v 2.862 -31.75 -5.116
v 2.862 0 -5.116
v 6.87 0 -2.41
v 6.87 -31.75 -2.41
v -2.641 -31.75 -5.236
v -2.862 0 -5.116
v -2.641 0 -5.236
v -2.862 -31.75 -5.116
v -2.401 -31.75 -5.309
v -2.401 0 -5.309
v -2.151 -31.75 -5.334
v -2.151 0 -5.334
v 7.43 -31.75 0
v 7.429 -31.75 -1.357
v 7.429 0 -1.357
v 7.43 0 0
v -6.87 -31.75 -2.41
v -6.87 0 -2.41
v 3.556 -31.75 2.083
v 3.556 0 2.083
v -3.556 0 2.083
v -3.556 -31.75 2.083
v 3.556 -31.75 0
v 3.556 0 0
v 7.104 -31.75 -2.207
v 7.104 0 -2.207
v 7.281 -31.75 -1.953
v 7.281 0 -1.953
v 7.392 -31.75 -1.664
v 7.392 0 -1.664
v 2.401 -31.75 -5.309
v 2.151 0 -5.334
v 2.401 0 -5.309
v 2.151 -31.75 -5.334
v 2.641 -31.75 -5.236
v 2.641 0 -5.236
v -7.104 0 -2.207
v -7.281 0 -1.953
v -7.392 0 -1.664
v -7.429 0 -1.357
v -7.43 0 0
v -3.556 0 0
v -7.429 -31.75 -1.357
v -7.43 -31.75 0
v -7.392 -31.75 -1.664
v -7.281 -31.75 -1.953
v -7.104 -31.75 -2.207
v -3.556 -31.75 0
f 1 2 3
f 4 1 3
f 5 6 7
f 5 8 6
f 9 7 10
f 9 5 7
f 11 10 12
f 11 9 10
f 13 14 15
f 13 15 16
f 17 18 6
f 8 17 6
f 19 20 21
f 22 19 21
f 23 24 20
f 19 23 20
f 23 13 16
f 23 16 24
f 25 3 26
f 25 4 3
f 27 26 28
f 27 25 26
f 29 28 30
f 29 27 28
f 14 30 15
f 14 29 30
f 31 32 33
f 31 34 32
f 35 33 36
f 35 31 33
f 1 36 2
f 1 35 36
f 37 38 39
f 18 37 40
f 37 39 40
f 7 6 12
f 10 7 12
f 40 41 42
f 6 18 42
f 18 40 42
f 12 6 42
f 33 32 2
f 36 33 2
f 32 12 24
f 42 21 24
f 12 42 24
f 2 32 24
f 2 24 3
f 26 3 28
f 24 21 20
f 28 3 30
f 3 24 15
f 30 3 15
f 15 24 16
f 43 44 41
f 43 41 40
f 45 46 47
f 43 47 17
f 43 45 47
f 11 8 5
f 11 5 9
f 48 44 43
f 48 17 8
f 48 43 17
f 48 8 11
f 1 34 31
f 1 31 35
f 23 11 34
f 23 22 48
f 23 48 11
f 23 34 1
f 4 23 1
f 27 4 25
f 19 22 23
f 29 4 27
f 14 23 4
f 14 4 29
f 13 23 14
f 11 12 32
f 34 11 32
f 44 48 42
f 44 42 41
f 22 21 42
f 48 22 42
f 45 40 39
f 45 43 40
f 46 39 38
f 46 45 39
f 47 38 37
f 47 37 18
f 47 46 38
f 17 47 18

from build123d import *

# Parameters (mm, degrees)
F1_DEPTH = 31.75
F3_R     = 1.27


# Not quite as in the source:
# - a feature names something its author has since deleted; it is built from what else it names


with BuildPart() as f1:
    # F0 (on Front) → F1 (new body)
    with BuildSketch(Plane.XZ):
        Polygon((3.556, 2.0828), (-3.556, 2.0828), (-3.556, 0), (-7.4295, 0), (-7.4295, -2.032), (-2.54, -5.334), (2.54, -5.334), (7.4295, -2.032), (7.4295, 0), (3.556, 0), align=None)
    extrude(amount=F1_DEPTH)

    # F3
    f3_edges = [f1.edges().sort_by_distance(p)[0] for p in [
        (7.4295, -15.875, -2.032),
        (2.54, -15.875, -5.334),
        (-2.54, -15.875, -5.334),
        (-7.4295, -15.875, -2.032),
    ]]
    fillet(f3_edges, radius=F3_R)


solid = f1.part
